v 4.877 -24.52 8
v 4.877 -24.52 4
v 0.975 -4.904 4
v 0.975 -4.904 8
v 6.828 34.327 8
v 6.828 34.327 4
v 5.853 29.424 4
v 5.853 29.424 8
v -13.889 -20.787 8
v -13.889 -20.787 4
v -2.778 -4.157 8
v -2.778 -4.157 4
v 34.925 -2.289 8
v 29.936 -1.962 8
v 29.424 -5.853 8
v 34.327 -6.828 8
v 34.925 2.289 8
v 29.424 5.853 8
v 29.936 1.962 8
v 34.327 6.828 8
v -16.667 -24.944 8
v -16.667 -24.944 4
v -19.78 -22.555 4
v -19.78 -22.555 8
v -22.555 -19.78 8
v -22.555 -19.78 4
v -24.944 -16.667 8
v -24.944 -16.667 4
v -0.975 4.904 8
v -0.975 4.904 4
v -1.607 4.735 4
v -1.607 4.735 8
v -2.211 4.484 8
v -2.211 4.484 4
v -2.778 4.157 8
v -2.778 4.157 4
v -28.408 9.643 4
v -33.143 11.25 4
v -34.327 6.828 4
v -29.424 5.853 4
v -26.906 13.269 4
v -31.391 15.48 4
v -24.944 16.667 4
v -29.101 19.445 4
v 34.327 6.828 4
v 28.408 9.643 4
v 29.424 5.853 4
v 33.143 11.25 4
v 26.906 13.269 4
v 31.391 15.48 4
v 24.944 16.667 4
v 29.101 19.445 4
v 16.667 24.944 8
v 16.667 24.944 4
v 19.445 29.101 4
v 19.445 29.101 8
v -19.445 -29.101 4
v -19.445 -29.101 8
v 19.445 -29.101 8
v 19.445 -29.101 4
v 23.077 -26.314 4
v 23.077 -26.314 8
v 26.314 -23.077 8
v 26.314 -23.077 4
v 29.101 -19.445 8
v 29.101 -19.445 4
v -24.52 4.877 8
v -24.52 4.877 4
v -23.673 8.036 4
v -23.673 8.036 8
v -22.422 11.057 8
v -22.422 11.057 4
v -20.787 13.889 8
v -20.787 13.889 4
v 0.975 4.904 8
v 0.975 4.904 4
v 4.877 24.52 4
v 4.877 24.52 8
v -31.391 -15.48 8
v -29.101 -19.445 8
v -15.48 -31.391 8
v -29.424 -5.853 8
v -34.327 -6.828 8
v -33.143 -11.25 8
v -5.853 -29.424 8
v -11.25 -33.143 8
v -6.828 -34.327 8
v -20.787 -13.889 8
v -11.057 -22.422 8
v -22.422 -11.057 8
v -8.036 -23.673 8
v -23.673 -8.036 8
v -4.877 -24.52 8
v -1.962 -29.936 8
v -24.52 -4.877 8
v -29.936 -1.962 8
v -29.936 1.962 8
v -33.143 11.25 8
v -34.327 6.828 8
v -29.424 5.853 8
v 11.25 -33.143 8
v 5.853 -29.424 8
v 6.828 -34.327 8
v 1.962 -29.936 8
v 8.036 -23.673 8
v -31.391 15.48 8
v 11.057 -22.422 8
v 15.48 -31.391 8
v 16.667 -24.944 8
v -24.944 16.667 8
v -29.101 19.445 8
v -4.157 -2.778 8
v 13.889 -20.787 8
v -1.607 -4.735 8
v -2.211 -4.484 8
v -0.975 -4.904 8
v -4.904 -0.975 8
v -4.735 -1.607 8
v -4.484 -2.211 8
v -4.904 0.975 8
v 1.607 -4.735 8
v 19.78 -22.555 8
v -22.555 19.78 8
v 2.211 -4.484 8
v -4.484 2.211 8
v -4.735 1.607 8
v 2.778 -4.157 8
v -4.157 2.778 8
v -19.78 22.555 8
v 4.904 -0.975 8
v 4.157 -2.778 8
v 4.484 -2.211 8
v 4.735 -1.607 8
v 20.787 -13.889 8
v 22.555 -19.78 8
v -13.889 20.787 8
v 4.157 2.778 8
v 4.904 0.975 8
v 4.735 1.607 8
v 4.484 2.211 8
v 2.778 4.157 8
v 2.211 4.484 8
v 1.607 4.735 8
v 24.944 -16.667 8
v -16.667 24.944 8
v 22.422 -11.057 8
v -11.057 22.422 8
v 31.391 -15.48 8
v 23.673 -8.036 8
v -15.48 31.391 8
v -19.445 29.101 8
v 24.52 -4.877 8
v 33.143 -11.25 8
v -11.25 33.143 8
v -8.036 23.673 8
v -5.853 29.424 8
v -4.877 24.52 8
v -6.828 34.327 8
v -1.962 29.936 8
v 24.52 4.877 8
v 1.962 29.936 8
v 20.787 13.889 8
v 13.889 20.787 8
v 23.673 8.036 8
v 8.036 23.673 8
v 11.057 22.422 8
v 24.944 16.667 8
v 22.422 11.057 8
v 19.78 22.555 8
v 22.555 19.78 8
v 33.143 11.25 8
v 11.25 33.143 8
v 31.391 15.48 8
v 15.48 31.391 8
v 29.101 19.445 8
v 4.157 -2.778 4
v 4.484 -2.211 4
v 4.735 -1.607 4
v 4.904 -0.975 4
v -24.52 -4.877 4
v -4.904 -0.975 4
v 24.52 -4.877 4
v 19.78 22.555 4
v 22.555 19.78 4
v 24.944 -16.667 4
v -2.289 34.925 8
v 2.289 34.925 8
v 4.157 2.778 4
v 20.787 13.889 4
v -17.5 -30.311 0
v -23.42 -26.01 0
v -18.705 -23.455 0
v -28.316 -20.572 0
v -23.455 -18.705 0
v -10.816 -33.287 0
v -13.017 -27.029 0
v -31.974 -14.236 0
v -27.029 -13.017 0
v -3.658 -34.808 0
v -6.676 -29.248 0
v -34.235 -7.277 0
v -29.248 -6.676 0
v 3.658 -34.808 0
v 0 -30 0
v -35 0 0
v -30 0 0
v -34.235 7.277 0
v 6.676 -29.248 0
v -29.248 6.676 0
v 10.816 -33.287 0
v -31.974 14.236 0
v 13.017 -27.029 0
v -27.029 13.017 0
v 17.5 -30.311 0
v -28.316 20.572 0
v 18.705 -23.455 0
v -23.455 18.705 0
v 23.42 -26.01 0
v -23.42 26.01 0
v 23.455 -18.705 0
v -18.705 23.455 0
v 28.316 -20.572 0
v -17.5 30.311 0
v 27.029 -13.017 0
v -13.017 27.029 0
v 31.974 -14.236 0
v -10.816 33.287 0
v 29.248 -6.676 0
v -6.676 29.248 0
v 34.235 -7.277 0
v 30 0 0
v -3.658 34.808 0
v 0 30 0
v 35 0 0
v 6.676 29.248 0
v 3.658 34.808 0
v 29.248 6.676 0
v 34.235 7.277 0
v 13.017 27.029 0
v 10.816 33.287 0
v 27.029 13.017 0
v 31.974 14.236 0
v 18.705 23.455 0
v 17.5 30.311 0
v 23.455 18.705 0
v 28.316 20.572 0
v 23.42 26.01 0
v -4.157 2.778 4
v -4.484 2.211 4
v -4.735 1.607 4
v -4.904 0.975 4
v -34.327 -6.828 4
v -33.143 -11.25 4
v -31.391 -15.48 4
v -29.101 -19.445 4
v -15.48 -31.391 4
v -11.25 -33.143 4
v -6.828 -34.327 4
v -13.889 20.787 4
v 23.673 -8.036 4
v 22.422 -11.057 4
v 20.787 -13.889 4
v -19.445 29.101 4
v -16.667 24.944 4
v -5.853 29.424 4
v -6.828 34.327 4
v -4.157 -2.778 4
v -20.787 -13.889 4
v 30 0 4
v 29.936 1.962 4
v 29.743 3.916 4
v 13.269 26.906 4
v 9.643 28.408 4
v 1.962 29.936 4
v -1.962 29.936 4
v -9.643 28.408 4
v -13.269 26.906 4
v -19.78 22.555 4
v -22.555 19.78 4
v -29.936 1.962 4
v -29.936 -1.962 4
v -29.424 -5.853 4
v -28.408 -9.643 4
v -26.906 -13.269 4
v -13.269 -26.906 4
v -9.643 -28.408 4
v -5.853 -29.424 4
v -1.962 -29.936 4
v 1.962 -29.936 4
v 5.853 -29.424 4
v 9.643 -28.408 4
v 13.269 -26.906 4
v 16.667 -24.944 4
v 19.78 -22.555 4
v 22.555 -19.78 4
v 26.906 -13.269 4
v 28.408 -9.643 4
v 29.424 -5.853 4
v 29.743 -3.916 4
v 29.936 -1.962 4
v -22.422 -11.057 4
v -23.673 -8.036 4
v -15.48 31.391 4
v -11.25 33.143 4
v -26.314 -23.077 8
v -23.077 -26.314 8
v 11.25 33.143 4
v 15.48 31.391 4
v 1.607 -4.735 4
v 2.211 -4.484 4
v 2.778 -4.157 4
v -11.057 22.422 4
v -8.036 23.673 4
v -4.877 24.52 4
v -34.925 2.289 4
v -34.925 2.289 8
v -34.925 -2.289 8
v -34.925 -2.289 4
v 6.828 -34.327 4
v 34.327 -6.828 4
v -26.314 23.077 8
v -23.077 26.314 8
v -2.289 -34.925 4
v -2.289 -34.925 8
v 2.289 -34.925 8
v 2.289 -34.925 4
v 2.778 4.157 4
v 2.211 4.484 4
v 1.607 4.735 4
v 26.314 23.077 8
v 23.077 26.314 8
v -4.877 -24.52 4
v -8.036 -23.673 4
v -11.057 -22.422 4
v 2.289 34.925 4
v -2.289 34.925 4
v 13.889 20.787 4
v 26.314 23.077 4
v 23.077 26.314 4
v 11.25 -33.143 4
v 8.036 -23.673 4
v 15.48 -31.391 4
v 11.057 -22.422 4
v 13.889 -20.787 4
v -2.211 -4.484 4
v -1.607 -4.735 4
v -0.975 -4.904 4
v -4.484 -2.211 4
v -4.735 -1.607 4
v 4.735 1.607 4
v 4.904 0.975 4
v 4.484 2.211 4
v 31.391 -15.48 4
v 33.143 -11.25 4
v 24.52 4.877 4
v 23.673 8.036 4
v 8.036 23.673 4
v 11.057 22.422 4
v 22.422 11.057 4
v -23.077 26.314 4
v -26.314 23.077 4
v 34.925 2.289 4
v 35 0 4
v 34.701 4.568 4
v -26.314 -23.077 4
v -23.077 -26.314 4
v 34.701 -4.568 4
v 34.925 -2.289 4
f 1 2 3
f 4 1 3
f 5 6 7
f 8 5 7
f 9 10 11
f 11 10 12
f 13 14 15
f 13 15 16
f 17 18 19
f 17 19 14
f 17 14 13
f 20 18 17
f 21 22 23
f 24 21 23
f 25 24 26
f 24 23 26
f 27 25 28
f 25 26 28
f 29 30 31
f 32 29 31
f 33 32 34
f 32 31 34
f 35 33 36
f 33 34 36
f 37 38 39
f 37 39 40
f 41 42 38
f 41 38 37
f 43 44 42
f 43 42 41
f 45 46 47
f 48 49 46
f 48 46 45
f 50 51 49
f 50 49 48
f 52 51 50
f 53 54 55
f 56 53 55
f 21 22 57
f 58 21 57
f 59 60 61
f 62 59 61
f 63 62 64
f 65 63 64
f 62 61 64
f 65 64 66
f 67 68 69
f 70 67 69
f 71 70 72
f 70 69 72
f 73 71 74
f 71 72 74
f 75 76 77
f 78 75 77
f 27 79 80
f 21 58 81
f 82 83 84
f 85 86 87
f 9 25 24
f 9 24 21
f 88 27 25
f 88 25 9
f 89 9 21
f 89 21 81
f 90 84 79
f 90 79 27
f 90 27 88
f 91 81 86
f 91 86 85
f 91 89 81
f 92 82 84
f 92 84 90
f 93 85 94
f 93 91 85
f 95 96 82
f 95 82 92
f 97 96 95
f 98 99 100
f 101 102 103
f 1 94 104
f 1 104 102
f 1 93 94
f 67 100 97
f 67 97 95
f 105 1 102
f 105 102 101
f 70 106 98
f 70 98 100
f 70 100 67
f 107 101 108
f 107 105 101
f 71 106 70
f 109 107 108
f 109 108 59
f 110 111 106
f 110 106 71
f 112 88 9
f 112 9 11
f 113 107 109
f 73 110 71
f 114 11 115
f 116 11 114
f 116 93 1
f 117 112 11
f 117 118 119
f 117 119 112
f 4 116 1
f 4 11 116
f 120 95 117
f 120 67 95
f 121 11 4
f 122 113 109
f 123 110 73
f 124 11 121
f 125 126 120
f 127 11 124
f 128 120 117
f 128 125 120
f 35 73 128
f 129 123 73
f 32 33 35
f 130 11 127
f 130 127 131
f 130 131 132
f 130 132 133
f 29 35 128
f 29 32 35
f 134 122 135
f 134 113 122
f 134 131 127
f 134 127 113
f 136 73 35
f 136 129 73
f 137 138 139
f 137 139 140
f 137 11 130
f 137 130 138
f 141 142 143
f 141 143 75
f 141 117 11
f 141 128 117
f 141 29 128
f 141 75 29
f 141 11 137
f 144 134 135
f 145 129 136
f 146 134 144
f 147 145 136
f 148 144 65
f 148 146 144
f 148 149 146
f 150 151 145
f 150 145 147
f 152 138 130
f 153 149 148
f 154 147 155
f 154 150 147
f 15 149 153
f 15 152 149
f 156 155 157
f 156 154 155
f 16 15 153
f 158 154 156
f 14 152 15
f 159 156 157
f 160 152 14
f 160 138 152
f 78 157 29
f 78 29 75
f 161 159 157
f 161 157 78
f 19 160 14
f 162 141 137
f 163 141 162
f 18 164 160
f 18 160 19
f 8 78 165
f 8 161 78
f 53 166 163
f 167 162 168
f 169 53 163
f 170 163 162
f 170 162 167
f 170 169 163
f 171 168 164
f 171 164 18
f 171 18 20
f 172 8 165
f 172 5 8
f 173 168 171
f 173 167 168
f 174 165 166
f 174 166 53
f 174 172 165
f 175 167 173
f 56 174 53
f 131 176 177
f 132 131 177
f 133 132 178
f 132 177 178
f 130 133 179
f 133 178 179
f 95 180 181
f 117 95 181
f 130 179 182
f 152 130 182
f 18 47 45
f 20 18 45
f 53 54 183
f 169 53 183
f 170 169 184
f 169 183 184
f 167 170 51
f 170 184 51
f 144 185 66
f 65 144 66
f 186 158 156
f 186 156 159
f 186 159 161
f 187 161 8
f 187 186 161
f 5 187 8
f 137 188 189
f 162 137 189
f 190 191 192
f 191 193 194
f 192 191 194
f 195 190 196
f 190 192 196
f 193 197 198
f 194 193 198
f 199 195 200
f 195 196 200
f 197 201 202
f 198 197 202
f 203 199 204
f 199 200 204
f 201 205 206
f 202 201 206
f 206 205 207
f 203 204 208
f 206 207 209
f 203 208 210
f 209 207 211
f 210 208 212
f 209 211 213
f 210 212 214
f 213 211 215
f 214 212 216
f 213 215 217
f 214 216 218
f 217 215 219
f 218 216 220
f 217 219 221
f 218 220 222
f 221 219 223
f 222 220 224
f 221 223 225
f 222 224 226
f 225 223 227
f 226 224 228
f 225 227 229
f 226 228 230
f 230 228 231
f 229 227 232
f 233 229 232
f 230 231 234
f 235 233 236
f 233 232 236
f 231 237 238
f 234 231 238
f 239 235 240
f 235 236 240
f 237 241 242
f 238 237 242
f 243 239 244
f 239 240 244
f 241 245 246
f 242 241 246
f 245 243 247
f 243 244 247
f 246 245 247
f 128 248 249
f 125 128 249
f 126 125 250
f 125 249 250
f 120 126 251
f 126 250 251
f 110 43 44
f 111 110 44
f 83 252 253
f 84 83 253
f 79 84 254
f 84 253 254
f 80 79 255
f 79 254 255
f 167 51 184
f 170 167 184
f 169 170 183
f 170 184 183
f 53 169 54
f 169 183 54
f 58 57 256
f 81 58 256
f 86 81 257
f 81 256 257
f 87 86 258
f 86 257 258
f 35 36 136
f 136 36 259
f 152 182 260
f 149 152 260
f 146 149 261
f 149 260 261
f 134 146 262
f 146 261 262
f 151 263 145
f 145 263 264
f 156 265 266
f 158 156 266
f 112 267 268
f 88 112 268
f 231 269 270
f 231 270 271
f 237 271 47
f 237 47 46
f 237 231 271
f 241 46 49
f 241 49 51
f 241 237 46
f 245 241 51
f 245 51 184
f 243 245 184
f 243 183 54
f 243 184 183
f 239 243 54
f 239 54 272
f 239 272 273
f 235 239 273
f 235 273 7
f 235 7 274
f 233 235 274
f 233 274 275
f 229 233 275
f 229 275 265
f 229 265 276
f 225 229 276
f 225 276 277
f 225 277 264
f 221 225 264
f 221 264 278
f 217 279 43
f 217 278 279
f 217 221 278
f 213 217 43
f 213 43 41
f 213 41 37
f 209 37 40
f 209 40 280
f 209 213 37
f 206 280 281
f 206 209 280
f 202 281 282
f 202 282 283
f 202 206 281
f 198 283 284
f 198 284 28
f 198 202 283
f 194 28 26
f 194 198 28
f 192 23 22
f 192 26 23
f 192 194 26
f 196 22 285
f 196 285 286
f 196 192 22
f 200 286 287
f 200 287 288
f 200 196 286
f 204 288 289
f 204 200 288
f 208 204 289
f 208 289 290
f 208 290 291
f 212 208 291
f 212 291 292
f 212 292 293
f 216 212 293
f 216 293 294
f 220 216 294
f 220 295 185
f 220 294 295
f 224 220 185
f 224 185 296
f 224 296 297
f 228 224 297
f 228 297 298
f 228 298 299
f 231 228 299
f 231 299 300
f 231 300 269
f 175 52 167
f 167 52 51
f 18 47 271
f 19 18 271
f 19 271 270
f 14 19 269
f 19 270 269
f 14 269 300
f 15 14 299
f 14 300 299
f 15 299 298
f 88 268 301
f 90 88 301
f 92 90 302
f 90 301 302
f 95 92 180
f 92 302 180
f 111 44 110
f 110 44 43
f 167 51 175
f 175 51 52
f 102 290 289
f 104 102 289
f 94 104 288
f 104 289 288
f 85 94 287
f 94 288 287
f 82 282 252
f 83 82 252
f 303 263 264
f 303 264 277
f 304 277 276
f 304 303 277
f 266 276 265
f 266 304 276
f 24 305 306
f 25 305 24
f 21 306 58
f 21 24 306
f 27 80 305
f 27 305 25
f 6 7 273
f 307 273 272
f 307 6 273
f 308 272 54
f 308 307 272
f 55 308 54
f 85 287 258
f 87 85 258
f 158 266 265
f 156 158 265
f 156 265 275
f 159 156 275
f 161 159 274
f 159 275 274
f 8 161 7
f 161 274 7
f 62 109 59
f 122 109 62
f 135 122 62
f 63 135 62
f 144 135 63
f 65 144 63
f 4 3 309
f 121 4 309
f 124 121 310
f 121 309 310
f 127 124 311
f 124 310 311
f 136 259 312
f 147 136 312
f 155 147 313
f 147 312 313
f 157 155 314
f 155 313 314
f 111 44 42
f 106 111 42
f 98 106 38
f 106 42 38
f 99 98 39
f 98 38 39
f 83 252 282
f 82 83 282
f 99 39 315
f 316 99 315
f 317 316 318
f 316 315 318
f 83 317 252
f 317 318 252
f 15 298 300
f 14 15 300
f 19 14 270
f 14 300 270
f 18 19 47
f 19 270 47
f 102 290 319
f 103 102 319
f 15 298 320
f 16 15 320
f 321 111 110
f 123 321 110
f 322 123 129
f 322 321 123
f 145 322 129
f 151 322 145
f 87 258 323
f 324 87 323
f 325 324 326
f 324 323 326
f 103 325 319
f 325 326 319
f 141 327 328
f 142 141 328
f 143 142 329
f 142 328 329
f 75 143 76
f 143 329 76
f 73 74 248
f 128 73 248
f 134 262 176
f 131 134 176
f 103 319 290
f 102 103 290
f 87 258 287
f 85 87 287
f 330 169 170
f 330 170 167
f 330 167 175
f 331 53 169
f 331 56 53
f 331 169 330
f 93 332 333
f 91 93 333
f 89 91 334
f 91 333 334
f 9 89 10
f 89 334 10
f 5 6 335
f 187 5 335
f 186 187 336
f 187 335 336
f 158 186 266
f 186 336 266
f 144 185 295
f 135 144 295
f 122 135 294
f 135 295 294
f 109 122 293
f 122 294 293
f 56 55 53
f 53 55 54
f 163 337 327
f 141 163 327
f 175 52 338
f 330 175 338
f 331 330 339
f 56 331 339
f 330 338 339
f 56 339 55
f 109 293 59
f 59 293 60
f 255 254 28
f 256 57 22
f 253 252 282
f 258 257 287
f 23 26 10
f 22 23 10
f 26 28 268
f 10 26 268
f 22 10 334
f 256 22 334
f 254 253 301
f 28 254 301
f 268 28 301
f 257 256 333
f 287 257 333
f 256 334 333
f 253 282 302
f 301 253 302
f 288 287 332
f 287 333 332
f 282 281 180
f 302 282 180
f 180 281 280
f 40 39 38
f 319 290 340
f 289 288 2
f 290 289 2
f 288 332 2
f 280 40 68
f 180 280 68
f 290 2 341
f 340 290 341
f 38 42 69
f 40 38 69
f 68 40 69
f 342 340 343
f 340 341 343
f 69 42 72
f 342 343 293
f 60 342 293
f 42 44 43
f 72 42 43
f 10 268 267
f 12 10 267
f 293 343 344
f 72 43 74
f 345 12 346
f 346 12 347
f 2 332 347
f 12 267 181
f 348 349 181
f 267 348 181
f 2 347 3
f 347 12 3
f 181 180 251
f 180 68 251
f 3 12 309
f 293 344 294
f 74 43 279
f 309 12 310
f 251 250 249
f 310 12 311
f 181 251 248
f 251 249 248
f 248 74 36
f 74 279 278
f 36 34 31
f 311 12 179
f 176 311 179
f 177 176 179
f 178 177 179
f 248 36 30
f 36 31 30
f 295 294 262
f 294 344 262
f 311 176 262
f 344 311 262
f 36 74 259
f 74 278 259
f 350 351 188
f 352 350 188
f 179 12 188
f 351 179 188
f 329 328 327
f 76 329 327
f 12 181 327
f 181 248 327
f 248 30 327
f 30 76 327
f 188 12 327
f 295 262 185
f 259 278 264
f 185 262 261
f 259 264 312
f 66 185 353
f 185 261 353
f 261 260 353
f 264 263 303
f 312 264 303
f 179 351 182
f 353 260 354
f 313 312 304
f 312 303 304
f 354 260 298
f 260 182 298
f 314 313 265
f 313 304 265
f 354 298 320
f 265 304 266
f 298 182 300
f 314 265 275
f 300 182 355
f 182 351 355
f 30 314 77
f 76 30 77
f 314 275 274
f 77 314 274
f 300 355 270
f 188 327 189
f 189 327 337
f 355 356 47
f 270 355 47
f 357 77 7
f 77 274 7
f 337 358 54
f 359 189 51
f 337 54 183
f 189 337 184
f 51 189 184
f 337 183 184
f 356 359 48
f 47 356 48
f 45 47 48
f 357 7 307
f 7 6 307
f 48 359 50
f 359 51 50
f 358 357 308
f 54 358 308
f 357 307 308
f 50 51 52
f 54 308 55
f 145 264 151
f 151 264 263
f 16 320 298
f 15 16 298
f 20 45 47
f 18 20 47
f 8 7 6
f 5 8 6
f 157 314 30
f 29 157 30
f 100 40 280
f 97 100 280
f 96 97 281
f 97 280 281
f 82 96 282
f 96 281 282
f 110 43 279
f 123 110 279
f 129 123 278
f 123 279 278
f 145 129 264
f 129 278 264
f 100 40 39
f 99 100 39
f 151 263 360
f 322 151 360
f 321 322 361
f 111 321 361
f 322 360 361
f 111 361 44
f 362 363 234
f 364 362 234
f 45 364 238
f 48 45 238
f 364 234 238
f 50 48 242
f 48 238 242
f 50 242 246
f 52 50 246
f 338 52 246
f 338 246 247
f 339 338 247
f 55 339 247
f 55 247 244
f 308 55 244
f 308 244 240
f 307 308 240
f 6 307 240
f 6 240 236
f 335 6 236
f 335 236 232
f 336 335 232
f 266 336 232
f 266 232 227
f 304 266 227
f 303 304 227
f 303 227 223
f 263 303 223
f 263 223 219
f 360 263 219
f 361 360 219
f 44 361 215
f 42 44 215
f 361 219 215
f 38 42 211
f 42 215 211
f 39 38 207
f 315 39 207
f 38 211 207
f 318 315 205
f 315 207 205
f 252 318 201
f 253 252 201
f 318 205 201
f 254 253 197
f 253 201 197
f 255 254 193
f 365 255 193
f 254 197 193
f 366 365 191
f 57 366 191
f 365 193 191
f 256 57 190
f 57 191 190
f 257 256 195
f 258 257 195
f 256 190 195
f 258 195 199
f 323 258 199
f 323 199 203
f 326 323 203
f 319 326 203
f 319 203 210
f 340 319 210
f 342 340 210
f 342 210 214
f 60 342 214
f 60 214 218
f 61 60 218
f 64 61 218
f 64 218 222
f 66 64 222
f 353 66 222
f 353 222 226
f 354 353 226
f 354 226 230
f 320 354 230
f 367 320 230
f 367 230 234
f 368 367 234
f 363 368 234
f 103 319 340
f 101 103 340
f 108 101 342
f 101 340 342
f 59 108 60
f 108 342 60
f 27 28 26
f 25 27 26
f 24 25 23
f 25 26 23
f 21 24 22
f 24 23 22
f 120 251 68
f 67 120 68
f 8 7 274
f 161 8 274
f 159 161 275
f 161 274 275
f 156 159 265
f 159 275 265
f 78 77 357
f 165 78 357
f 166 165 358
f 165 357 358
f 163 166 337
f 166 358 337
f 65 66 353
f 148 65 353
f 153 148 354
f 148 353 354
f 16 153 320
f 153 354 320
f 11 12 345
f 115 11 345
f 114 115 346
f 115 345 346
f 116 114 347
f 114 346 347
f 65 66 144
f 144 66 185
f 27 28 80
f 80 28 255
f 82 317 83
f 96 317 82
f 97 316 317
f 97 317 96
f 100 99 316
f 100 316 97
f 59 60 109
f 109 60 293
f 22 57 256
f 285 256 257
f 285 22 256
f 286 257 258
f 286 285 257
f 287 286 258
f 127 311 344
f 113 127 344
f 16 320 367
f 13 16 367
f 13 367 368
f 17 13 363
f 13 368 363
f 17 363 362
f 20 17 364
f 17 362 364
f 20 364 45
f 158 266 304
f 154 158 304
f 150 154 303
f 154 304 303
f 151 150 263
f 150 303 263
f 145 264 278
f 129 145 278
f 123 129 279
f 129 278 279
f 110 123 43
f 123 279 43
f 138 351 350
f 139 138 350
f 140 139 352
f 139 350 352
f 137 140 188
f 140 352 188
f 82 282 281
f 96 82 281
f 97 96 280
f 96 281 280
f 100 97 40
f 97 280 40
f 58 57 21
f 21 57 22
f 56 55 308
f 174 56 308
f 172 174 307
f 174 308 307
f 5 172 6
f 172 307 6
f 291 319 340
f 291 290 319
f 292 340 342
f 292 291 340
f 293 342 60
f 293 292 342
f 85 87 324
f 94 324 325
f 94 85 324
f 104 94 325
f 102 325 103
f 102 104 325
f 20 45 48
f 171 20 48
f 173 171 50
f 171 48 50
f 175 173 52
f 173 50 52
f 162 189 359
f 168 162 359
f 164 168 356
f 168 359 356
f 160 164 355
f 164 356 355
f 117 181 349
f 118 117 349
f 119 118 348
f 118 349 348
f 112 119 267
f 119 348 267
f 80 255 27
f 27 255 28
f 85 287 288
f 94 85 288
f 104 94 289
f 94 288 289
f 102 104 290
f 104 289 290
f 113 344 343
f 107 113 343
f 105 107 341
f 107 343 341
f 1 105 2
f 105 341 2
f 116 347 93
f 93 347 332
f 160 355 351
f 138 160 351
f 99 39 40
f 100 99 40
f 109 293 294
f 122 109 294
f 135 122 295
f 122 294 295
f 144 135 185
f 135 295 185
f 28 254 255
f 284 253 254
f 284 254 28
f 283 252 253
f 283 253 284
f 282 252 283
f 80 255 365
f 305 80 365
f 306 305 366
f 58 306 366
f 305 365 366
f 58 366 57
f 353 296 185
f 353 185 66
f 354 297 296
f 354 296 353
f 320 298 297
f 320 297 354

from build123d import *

# Parameters (mm, degrees)
F0_R     = 35
F0_R_2   = 30
F1_DEPTH = 4
F3_DEPTH = 4
F5_DEPTH = 4


# Not quite as in the source:
# - after a boolean that leaves OpenCascade's solid faulty, fix() repairs it


with BuildPart() as f1:
    # F0 (on Top) → F1 (new body)
    with BuildSketch(Plane.XY):
        Circle(F0_R)
        Circle(F0_R_2, mode=Mode.SUBTRACT)
    extrude(amount=F1_DEPTH)

    # F2 (on face) → F3 (join)
    with BuildSketch(Plane.XY.offset(4)):
        with BuildLine():
            Line((-6.8281612706, 34.3274848141), (-5.8527096605, 29.4235584121))
            ThreePointArc((-5.8527096605, 29.4235584121), (0, 30), (5.8527096605, 29.4235584121))
            Line((5.8527096605, 29.4235584121), (6.8281612706, 34.3274848141))
            ThreePointArc((6.8281612706, 34.3274848141), (0, 35), (-6.8281612706, 34.3274848141))
        make_face()
        with BuildLine():
            ThreePointArc((-24.9440883691, 16.6671069906), (-21.2132034356, 21.2132034356), (-16.6671069906, 24.9440883691))
            Line((-16.6671069906, 24.9440883691), (-19.4449581557, 29.1014364306))
            ThreePointArc((-19.4449581557, 29.1014364306), (-24.7487373415, 24.7487373415), (-29.1014364306, 19.4449581557))
            Line((-29.1014364306, 19.4449581557), (-24.9440883691, 16.6671069906))
        make_face()
        with BuildLine():
            ThreePointArc((-29.4235584121, -5.8527096605), (-30, 0), (-29.4235584121, 5.8527096605))
            Line((-29.4235584121, 5.8527096605), (-34.3274848141, 6.8281612706))
            ThreePointArc((-34.3274848141, 6.8281612706), (-35, 0), (-34.3274848141, -6.8281612706))
            Line((-34.3274848141, -6.8281612706), (-29.4235584121, -5.8527096605))
        make_face()
        with BuildLine():
            ThreePointArc((-16.6671069906, -24.9440883691), (-21.2132034356, -21.2132034356), (-24.9440883691, -16.6671069906))
            Line((-24.9440883691, -16.6671069906), (-29.1014364306, -19.4449581557))
            ThreePointArc((-29.1014364306, -19.4449581557), (-24.7487373415, -24.7487373415), (-19.4449581557, -29.1014364306))
            Line((-19.4449581557, -29.1014364306), (-16.6671069906, -24.9440883691))
        make_face()
        with BuildLine():
            ThreePointArc((5.8527096605, -29.4235584121), (0, -30), (-5.8527096605, -29.4235584121))
            Line((-5.8527096605, -29.4235584121), (-6.8281612706, -34.3274848141))
            ThreePointArc((-6.8281612706, -34.3274848141), (0, -35), (6.8281612706, -34.3274848141))
            Line((6.8281612706, -34.3274848141), (5.8527096605, -29.4235584121))
        make_face()
        with BuildLine():
            ThreePointArc((24.9440883691, -16.6671069906), (21.2132034356, -21.2132034356), (16.6671069906, -24.9440883691))
            Line((16.6671069906, -24.9440883691), (19.4449581557, -29.1014364306))
            ThreePointArc((19.4449581557, -29.1014364306), (24.7487373415, -24.7487373415), (29.1014364306, -19.4449581557))
            Line((29.1014364306, -19.4449581557), (24.9440883691, -16.6671069906))
        make_face()
        with BuildLine():
            ThreePointArc((29.4235584121, 5.8527096605), (30, 0), (29.4235584121, -5.8527096605))
            Line((29.4235584121, -5.8527096605), (34.3274848141, -6.8281612706))
            ThreePointArc((34.3274848141, -6.8281612706), (35, 0), (34.3274848141, 6.8281612706))
            Line((34.3274848141, 6.8281612706), (29.4235584121, 5.8527096605))
        make_face()
        with BuildLine():
            ThreePointArc((16.6671069906, 24.9440883691), (21.2132034356, 21.2132034356), (24.9440883691, 16.6671069906))
            Line((24.9440883691, 16.6671069906), (29.1014364306, 19.4449581557))
            ThreePointArc((29.1014364306, 19.4449581557), (24.7487373415, 24.7487373415), (19.4449581557, 29.1014364306))
            Line((19.4449581557, 29.1014364306), (16.6671069906, 24.9440883691))
        make_face()
    extrude(amount=F3_DEPTH)

    add(f1.part.fix(), mode=Mode.REPLACE)


with BuildPart() as f5:
    # F4 (on face) → F5 (new body)
    with BuildSketch(Plane.XY.offset(4)):
        with BuildLine():
            Line((-24.9440883691, 16.6671069906), (-29.1014364306, 19.4449581557))
            ThreePointArc((-29.1014364306, 19.4449581557), (-32.3357836379, 13.3939201328), (-34.3274848141, 6.8281612706))
            Line((-34.3274848141, 6.8281612706), (-29.4235584121, 5.8527096605))
            ThreePointArc((-29.4235584121, 5.8527096605), (-30, 0), (-29.4235584121, -5.8527096605))
            Line((-29.4235584121, -5.8527096605), (-34.3274848141, -6.8281612706))
            ThreePointArc((-34.3274848141, -6.8281612706), (-32.3357836379, -13.3939201328), (-29.1014364306, -19.4449581557))
            Line((-29.1014364306, -19.4449581557), (-24.9440883691, -16.6671069906))
            ThreePointArc((-24.9440883691, -16.6671069906), (-21.2132034356, -21.2132034356), (-16.6671069906, -24.9440883691))
            Line((-16.6671069906, -24.9440883691), (-19.4449581557, -29.1014364306))
            ThreePointArc((-19.4449581557, -29.1014364306), (-13.3939201328, -32.3357836379), (-6.8281612706, -34.3274848141))
            Line((-6.8281612706, -34.3274848141), (-5.8527096605, -29.4235584121))
            ThreePointArc((-5.8527096605, -29.4235584121), (0, -30), (5.8527096605, -29.4235584121))
            Line((5.8527096605, -29.4235584121), (6.8281612706, -34.3274848141))
            ThreePointArc((6.8281612706, -34.3274848141), (13.3939201328, -32.3357836379), (19.4449581557, -29.1014364306))
            Line((19.4449581557, -29.1014364306), (16.6671069906, -24.9440883691))
            ThreePointArc((16.6671069906, -24.9440883691), (21.2132034356, -21.2132034356), (24.9440883691, -16.6671069906))
            Line((24.9440883691, -16.6671069906), (29.1014364306, -19.4449581557))
            ThreePointArc((29.1014364306, -19.4449581557), (32.3357836379, -13.3939201328), (34.3274848141, -6.8281612706))
            Line((34.3274848141, -6.8281612706), (29.4235584121, -5.8527096605))
            ThreePointArc((29.4235584121, -5.8527096605), (30, 0), (29.4235584121, 5.8527096605))
            Line((29.4235584121, 5.8527096605), (34.3274848141, 6.8281612706))
            ThreePointArc((34.3274848141, 6.8281612706), (32.3357836379, 13.3939201328), (29.1014364306, 19.4449581557))
            Line((29.1014364306, 19.4449581557), (24.9440883691, 16.6671069906))
            ThreePointArc((24.9440883691, 16.6671069906), (21.2132034356, 21.2132034356), (16.6671069906, 24.9440883691))
            Line((16.6671069906, 24.9440883691), (19.4449581557, 29.1014364306))
            ThreePointArc((19.4449581557, 29.1014364306), (13.3939201328, 32.3357836379), (6.8281612706, 34.3274848141))
            Line((6.8281612706, 34.3274848141), (5.8527096605, 29.4235584121))
            ThreePointArc((5.8527096605, 29.4235584121), (0, 30), (-5.8527096605, 29.4235584121))
            Line((-5.8527096605, 29.4235584121), (-6.8281612706, 34.3274848141))
            ThreePointArc((-6.8281612706, 34.3274848141), (-13.3939201328, 32.3357836379), (-19.4449581557, 29.1014364306))
            Line((-19.4449581557, 29.1014364306), (-16.6671069906, 24.9440883691))
            ThreePointArc((-16.6671069906, 24.9440883691), (-21.2132034356, 21.2132034356), (-24.9440883691, 16.6671069906))
        make_face()
        with BuildLine():
            ThreePointArc((-2.7778511776, -4.1573480531), (-1.913417175, -4.6193976571), (-0.9754516234, -4.9039263994))
            Line((-0.9754516234, -4.9039263994), (-4.8772581169, -24.5196319969))
            ThreePointArc((-4.8772581169, -24.5196319969), (-9.5670858752, -23.0969882854), (-13.8892558881, -20.7867402657))
            Line((-13.8892558881, -20.7867402657), (-2.7778511776, -4.1573480531))
        make_face(mode=Mode.SUBTRACT)
        with BuildLine():
            ThreePointArc((-4.9039264055, -0.9754515924), (-4.6193976692, -1.9134171458), (-4.1573480707, -2.7778511513))
            Line((-4.1573480707, -2.7778511513), (-20.7867403536, -13.8892557566))
            ThreePointArc((-20.7867403536, -13.8892557566), (-23.0969883459, -9.5670857291), (-24.5196320277, -4.8772579618))
            Line((-24.5196320277, -4.8772579618), (-4.9039264055, -0.9754515924))
        make_face(mode=Mode.SUBTRACT)
        with BuildLine():
            ThreePointArc((0.9754515983, -4.9039264044), (1.9134171514, -4.6193976669), (2.7778511563, -4.1573480674))
            Line((2.7778511563, -4.1573480674), (13.8892557817, -20.7867403369))
            ThreePointArc((13.8892557817, -20.7867403369), (9.5670857569, -23.0969883344), (4.8772579913, -24.5196320218))
            Line((4.8772579913, -24.5196320218), (0.9754515983, -4.9039264044))
        make_face(mode=Mode.SUBTRACT)
        with BuildLine():
            Line((20.7867402825, -13.8892558631), (4.1573480565, -2.7778511726))
            ThreePointArc((4.1573480565, -2.7778511726), (4.6193976594, -1.9134171695), (4.9039264005, -0.9754516175))
            Line((4.9039264005, -0.9754516175), (24.5196320027, -4.8772580873))
            ThreePointArc((24.5196320027, -4.8772580873), (23.0969882969, -9.5670858474), (20.7867402825, -13.8892558631))
        make_face(mode=Mode.SUBTRACT)
        with BuildLine():
            ThreePointArc((-4.1573480498, 2.7778511826), (-4.6193976548, 1.9134171806), (-4.9039263982, 0.9754516293))
            Line((-4.9039263982, 0.9754516293), (-24.519631991, 4.8772581464))
            ThreePointArc((-24.519631991, 4.8772581464), (-23.0969882739, 9.5670859031), (-20.786740249, 13.8892559132))
            Line((-20.786740249, 13.8892559132), (-4.1573480498, 2.7778511826))
        make_face(mode=Mode.SUBTRACT)
        with BuildLine():
            ThreePointArc((-13.8892557316, 20.7867403703), (-9.5670857569, 23.0969883344), (-4.8772580504, 24.5196320101))
            Line((-4.8772580504, 24.5196320101), (-0.9754516101, 4.903926402))
            ThreePointArc((-0.9754516101, 4.903926402), (-1.9134171514, 4.6193976669), (-2.7778511463, 4.1573480741))
            Line((-2.7778511463, 4.1573480741), (-13.8892557316, 20.7867403703))
        make_face(mode=Mode.SUBTRACT)
        with BuildLine():
            ThreePointArc((4.9039264032, 0.9754516042), (4.6193976646, 1.913417157), (4.157348064, 2.7778511613))
            Line((4.157348064, 2.7778511613), (20.7867403201, 13.8892558067))
            ThreePointArc((20.7867403201, 13.8892558067), (23.0969883229, 9.5670857848), (24.519632016, 4.8772580209))
            Line((24.519632016, 4.8772580209), (4.9039264032, 0.9754516042))
        make_face(mode=Mode.SUBTRACT)
        with BuildLine():
            ThreePointArc((2.7778511676, 4.1573480598), (1.9134171639, 4.6193976617), (0.9754516116, 4.9039264017))
            Line((0.9754516116, 4.9039264017), (4.8772580578, 24.5196320086))
            ThreePointArc((4.8772580578, 24.5196320086), (9.5670858196, 23.0969883085), (13.889255838, 20.7867402992))
            Line((13.889255838, 20.7867402992), (2.7778511676, 4.1573480598))
        make_face(mode=Mode.SUBTRACT)
    extrude(amount=F5_DEPTH)


solid = Compound([f1.part, f5.part])
